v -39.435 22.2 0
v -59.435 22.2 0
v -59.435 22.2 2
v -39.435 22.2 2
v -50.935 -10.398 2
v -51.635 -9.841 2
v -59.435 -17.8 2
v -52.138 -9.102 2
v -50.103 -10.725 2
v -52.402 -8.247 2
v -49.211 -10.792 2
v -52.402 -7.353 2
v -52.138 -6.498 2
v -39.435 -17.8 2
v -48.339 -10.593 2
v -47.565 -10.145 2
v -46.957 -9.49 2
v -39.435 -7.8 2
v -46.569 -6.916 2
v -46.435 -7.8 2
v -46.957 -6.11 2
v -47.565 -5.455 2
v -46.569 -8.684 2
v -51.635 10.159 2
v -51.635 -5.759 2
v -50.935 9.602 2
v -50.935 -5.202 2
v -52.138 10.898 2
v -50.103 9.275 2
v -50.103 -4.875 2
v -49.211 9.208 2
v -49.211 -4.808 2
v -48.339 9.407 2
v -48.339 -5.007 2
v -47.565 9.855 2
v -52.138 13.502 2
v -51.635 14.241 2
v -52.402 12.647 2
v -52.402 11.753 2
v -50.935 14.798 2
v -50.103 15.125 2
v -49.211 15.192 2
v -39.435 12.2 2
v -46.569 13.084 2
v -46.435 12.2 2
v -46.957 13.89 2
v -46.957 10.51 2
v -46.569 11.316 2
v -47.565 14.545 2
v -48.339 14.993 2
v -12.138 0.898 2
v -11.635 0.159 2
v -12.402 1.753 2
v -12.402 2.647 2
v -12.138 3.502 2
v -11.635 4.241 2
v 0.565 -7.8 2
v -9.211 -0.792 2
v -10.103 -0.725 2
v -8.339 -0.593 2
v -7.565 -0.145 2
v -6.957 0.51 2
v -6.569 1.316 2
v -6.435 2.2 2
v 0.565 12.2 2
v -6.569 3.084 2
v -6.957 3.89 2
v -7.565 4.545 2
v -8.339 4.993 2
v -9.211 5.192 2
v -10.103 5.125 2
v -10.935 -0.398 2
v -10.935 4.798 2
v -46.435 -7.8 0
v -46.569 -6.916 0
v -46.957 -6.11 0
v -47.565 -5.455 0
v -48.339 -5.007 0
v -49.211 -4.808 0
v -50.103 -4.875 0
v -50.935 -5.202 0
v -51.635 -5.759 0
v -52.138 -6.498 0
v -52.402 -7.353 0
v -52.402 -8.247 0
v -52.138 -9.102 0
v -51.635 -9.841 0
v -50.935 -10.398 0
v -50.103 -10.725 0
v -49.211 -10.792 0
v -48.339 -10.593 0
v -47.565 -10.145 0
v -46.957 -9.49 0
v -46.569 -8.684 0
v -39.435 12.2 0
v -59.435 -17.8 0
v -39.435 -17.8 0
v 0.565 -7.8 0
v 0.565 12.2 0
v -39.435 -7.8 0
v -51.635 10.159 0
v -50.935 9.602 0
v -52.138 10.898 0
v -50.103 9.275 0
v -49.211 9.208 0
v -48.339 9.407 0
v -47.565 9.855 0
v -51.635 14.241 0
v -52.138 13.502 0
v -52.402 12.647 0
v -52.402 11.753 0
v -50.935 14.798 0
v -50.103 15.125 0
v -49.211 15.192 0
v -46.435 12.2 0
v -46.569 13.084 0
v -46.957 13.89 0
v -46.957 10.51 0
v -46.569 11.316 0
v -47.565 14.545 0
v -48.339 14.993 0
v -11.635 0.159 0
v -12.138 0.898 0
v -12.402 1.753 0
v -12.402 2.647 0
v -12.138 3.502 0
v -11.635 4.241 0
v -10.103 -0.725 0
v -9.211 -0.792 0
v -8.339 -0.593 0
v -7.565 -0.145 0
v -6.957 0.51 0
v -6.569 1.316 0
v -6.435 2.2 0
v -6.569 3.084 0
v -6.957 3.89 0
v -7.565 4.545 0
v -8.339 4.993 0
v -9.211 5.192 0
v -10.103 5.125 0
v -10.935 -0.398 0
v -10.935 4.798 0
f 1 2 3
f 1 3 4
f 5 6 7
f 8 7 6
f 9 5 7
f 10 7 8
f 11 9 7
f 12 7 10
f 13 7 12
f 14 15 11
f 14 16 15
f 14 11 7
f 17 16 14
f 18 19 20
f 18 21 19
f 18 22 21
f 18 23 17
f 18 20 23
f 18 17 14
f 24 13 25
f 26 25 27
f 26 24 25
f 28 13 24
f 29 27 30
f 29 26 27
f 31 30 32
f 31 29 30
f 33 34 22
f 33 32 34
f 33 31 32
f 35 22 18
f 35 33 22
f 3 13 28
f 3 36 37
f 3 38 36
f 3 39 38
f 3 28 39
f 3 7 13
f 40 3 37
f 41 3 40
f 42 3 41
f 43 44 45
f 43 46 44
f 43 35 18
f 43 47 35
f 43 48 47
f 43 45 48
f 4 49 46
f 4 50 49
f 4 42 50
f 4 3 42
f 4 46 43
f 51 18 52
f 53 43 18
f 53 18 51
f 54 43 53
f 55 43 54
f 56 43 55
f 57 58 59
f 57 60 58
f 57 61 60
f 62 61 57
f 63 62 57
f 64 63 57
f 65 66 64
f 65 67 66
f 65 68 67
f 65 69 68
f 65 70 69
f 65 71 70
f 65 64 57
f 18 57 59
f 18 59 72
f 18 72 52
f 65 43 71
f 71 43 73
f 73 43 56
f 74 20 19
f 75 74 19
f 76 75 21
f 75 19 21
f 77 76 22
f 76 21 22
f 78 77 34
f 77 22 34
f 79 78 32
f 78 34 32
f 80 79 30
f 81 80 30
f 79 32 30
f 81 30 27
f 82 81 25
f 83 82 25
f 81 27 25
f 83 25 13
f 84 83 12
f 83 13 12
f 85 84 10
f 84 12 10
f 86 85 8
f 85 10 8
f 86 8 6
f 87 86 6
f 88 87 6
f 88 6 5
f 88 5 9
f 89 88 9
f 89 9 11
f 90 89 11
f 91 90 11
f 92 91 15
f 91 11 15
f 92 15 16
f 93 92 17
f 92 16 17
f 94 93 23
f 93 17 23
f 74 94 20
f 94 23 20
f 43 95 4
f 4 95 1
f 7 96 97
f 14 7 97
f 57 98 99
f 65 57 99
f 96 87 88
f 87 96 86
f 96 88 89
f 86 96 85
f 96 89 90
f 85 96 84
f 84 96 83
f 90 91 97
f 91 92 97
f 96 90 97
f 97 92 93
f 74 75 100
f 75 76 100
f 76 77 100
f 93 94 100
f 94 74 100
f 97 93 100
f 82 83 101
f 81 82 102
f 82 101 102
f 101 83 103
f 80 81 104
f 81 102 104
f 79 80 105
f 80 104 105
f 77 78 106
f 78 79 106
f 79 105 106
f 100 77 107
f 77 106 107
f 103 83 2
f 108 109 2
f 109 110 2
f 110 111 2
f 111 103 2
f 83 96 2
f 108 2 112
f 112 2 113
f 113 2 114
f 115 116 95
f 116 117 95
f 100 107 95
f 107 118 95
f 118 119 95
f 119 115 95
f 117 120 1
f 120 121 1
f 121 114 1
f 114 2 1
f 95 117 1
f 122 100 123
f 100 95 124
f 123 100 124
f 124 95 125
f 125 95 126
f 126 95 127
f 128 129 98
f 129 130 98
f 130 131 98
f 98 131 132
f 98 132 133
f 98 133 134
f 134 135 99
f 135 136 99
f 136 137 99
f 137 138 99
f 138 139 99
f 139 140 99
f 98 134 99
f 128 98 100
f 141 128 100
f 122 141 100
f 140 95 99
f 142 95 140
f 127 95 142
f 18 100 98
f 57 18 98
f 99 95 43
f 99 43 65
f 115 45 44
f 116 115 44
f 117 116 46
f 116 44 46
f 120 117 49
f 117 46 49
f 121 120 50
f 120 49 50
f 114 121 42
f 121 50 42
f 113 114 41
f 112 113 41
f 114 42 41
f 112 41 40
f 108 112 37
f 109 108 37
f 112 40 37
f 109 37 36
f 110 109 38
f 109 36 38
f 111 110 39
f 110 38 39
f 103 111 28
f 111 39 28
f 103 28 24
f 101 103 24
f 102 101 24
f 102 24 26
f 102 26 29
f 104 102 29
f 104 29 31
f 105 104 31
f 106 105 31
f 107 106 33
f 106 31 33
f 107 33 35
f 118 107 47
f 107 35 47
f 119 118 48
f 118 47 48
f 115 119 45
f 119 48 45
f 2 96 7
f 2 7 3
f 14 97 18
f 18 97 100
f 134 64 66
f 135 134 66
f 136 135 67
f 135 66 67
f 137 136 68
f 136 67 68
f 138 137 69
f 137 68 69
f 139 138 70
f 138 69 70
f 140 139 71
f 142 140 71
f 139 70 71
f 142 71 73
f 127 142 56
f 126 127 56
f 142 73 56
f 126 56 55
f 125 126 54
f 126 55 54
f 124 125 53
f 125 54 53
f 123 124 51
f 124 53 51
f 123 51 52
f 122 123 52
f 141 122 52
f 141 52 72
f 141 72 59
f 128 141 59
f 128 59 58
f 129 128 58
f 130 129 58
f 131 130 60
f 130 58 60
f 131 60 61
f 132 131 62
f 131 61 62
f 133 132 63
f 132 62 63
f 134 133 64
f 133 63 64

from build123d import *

# Parameters (mm, degrees)
SZKIC1_W                    = 40
SZKIC1_H                    = 20
SZKIC1_W_2                  = 20
SZKIC1_H_2                  = 40
DODANIE_WYCI_GNI_CIE1_DEPTH = 2
SZKIC2_R                    = 3
WYTNIJ_WYCI_GNI_CIE1_DEPTH  = 2


with BuildPart() as part:
    # Szkic1 → Dodanie-wyciągnięcie1 (new body)
    with BuildSketch(Plane.XY):
        with Locations((-19.435499515, 2.2)):
            Rectangle(SZKIC1_W, SZKIC1_H)
        with Locations((-49.435499515, 2.2)):
            Rectangle(SZKIC1_W_2, SZKIC1_H_2)
    extrude(amount=DODANIE_WYCI_GNI_CIE1_DEPTH)

    # Szkic2 → Wytnij-wyciągnięcie1 (cut)
    with BuildSketch(Plane.XY.offset(2)):
        with Locations((-9.435499515, 2.2)):
            Circle(SZKIC2_R)
        with Locations((-49.435499515, 12.2)):
            Circle(SZKIC2_R)
        with Locations((-49.435499515, -7.8)):
            Circle(SZKIC2_R)
    extrude(amount=-WYTNIJ_WYCI_GNI_CIE1_DEPTH, mode=Mode.SUBTRACT)


solid = part.part
